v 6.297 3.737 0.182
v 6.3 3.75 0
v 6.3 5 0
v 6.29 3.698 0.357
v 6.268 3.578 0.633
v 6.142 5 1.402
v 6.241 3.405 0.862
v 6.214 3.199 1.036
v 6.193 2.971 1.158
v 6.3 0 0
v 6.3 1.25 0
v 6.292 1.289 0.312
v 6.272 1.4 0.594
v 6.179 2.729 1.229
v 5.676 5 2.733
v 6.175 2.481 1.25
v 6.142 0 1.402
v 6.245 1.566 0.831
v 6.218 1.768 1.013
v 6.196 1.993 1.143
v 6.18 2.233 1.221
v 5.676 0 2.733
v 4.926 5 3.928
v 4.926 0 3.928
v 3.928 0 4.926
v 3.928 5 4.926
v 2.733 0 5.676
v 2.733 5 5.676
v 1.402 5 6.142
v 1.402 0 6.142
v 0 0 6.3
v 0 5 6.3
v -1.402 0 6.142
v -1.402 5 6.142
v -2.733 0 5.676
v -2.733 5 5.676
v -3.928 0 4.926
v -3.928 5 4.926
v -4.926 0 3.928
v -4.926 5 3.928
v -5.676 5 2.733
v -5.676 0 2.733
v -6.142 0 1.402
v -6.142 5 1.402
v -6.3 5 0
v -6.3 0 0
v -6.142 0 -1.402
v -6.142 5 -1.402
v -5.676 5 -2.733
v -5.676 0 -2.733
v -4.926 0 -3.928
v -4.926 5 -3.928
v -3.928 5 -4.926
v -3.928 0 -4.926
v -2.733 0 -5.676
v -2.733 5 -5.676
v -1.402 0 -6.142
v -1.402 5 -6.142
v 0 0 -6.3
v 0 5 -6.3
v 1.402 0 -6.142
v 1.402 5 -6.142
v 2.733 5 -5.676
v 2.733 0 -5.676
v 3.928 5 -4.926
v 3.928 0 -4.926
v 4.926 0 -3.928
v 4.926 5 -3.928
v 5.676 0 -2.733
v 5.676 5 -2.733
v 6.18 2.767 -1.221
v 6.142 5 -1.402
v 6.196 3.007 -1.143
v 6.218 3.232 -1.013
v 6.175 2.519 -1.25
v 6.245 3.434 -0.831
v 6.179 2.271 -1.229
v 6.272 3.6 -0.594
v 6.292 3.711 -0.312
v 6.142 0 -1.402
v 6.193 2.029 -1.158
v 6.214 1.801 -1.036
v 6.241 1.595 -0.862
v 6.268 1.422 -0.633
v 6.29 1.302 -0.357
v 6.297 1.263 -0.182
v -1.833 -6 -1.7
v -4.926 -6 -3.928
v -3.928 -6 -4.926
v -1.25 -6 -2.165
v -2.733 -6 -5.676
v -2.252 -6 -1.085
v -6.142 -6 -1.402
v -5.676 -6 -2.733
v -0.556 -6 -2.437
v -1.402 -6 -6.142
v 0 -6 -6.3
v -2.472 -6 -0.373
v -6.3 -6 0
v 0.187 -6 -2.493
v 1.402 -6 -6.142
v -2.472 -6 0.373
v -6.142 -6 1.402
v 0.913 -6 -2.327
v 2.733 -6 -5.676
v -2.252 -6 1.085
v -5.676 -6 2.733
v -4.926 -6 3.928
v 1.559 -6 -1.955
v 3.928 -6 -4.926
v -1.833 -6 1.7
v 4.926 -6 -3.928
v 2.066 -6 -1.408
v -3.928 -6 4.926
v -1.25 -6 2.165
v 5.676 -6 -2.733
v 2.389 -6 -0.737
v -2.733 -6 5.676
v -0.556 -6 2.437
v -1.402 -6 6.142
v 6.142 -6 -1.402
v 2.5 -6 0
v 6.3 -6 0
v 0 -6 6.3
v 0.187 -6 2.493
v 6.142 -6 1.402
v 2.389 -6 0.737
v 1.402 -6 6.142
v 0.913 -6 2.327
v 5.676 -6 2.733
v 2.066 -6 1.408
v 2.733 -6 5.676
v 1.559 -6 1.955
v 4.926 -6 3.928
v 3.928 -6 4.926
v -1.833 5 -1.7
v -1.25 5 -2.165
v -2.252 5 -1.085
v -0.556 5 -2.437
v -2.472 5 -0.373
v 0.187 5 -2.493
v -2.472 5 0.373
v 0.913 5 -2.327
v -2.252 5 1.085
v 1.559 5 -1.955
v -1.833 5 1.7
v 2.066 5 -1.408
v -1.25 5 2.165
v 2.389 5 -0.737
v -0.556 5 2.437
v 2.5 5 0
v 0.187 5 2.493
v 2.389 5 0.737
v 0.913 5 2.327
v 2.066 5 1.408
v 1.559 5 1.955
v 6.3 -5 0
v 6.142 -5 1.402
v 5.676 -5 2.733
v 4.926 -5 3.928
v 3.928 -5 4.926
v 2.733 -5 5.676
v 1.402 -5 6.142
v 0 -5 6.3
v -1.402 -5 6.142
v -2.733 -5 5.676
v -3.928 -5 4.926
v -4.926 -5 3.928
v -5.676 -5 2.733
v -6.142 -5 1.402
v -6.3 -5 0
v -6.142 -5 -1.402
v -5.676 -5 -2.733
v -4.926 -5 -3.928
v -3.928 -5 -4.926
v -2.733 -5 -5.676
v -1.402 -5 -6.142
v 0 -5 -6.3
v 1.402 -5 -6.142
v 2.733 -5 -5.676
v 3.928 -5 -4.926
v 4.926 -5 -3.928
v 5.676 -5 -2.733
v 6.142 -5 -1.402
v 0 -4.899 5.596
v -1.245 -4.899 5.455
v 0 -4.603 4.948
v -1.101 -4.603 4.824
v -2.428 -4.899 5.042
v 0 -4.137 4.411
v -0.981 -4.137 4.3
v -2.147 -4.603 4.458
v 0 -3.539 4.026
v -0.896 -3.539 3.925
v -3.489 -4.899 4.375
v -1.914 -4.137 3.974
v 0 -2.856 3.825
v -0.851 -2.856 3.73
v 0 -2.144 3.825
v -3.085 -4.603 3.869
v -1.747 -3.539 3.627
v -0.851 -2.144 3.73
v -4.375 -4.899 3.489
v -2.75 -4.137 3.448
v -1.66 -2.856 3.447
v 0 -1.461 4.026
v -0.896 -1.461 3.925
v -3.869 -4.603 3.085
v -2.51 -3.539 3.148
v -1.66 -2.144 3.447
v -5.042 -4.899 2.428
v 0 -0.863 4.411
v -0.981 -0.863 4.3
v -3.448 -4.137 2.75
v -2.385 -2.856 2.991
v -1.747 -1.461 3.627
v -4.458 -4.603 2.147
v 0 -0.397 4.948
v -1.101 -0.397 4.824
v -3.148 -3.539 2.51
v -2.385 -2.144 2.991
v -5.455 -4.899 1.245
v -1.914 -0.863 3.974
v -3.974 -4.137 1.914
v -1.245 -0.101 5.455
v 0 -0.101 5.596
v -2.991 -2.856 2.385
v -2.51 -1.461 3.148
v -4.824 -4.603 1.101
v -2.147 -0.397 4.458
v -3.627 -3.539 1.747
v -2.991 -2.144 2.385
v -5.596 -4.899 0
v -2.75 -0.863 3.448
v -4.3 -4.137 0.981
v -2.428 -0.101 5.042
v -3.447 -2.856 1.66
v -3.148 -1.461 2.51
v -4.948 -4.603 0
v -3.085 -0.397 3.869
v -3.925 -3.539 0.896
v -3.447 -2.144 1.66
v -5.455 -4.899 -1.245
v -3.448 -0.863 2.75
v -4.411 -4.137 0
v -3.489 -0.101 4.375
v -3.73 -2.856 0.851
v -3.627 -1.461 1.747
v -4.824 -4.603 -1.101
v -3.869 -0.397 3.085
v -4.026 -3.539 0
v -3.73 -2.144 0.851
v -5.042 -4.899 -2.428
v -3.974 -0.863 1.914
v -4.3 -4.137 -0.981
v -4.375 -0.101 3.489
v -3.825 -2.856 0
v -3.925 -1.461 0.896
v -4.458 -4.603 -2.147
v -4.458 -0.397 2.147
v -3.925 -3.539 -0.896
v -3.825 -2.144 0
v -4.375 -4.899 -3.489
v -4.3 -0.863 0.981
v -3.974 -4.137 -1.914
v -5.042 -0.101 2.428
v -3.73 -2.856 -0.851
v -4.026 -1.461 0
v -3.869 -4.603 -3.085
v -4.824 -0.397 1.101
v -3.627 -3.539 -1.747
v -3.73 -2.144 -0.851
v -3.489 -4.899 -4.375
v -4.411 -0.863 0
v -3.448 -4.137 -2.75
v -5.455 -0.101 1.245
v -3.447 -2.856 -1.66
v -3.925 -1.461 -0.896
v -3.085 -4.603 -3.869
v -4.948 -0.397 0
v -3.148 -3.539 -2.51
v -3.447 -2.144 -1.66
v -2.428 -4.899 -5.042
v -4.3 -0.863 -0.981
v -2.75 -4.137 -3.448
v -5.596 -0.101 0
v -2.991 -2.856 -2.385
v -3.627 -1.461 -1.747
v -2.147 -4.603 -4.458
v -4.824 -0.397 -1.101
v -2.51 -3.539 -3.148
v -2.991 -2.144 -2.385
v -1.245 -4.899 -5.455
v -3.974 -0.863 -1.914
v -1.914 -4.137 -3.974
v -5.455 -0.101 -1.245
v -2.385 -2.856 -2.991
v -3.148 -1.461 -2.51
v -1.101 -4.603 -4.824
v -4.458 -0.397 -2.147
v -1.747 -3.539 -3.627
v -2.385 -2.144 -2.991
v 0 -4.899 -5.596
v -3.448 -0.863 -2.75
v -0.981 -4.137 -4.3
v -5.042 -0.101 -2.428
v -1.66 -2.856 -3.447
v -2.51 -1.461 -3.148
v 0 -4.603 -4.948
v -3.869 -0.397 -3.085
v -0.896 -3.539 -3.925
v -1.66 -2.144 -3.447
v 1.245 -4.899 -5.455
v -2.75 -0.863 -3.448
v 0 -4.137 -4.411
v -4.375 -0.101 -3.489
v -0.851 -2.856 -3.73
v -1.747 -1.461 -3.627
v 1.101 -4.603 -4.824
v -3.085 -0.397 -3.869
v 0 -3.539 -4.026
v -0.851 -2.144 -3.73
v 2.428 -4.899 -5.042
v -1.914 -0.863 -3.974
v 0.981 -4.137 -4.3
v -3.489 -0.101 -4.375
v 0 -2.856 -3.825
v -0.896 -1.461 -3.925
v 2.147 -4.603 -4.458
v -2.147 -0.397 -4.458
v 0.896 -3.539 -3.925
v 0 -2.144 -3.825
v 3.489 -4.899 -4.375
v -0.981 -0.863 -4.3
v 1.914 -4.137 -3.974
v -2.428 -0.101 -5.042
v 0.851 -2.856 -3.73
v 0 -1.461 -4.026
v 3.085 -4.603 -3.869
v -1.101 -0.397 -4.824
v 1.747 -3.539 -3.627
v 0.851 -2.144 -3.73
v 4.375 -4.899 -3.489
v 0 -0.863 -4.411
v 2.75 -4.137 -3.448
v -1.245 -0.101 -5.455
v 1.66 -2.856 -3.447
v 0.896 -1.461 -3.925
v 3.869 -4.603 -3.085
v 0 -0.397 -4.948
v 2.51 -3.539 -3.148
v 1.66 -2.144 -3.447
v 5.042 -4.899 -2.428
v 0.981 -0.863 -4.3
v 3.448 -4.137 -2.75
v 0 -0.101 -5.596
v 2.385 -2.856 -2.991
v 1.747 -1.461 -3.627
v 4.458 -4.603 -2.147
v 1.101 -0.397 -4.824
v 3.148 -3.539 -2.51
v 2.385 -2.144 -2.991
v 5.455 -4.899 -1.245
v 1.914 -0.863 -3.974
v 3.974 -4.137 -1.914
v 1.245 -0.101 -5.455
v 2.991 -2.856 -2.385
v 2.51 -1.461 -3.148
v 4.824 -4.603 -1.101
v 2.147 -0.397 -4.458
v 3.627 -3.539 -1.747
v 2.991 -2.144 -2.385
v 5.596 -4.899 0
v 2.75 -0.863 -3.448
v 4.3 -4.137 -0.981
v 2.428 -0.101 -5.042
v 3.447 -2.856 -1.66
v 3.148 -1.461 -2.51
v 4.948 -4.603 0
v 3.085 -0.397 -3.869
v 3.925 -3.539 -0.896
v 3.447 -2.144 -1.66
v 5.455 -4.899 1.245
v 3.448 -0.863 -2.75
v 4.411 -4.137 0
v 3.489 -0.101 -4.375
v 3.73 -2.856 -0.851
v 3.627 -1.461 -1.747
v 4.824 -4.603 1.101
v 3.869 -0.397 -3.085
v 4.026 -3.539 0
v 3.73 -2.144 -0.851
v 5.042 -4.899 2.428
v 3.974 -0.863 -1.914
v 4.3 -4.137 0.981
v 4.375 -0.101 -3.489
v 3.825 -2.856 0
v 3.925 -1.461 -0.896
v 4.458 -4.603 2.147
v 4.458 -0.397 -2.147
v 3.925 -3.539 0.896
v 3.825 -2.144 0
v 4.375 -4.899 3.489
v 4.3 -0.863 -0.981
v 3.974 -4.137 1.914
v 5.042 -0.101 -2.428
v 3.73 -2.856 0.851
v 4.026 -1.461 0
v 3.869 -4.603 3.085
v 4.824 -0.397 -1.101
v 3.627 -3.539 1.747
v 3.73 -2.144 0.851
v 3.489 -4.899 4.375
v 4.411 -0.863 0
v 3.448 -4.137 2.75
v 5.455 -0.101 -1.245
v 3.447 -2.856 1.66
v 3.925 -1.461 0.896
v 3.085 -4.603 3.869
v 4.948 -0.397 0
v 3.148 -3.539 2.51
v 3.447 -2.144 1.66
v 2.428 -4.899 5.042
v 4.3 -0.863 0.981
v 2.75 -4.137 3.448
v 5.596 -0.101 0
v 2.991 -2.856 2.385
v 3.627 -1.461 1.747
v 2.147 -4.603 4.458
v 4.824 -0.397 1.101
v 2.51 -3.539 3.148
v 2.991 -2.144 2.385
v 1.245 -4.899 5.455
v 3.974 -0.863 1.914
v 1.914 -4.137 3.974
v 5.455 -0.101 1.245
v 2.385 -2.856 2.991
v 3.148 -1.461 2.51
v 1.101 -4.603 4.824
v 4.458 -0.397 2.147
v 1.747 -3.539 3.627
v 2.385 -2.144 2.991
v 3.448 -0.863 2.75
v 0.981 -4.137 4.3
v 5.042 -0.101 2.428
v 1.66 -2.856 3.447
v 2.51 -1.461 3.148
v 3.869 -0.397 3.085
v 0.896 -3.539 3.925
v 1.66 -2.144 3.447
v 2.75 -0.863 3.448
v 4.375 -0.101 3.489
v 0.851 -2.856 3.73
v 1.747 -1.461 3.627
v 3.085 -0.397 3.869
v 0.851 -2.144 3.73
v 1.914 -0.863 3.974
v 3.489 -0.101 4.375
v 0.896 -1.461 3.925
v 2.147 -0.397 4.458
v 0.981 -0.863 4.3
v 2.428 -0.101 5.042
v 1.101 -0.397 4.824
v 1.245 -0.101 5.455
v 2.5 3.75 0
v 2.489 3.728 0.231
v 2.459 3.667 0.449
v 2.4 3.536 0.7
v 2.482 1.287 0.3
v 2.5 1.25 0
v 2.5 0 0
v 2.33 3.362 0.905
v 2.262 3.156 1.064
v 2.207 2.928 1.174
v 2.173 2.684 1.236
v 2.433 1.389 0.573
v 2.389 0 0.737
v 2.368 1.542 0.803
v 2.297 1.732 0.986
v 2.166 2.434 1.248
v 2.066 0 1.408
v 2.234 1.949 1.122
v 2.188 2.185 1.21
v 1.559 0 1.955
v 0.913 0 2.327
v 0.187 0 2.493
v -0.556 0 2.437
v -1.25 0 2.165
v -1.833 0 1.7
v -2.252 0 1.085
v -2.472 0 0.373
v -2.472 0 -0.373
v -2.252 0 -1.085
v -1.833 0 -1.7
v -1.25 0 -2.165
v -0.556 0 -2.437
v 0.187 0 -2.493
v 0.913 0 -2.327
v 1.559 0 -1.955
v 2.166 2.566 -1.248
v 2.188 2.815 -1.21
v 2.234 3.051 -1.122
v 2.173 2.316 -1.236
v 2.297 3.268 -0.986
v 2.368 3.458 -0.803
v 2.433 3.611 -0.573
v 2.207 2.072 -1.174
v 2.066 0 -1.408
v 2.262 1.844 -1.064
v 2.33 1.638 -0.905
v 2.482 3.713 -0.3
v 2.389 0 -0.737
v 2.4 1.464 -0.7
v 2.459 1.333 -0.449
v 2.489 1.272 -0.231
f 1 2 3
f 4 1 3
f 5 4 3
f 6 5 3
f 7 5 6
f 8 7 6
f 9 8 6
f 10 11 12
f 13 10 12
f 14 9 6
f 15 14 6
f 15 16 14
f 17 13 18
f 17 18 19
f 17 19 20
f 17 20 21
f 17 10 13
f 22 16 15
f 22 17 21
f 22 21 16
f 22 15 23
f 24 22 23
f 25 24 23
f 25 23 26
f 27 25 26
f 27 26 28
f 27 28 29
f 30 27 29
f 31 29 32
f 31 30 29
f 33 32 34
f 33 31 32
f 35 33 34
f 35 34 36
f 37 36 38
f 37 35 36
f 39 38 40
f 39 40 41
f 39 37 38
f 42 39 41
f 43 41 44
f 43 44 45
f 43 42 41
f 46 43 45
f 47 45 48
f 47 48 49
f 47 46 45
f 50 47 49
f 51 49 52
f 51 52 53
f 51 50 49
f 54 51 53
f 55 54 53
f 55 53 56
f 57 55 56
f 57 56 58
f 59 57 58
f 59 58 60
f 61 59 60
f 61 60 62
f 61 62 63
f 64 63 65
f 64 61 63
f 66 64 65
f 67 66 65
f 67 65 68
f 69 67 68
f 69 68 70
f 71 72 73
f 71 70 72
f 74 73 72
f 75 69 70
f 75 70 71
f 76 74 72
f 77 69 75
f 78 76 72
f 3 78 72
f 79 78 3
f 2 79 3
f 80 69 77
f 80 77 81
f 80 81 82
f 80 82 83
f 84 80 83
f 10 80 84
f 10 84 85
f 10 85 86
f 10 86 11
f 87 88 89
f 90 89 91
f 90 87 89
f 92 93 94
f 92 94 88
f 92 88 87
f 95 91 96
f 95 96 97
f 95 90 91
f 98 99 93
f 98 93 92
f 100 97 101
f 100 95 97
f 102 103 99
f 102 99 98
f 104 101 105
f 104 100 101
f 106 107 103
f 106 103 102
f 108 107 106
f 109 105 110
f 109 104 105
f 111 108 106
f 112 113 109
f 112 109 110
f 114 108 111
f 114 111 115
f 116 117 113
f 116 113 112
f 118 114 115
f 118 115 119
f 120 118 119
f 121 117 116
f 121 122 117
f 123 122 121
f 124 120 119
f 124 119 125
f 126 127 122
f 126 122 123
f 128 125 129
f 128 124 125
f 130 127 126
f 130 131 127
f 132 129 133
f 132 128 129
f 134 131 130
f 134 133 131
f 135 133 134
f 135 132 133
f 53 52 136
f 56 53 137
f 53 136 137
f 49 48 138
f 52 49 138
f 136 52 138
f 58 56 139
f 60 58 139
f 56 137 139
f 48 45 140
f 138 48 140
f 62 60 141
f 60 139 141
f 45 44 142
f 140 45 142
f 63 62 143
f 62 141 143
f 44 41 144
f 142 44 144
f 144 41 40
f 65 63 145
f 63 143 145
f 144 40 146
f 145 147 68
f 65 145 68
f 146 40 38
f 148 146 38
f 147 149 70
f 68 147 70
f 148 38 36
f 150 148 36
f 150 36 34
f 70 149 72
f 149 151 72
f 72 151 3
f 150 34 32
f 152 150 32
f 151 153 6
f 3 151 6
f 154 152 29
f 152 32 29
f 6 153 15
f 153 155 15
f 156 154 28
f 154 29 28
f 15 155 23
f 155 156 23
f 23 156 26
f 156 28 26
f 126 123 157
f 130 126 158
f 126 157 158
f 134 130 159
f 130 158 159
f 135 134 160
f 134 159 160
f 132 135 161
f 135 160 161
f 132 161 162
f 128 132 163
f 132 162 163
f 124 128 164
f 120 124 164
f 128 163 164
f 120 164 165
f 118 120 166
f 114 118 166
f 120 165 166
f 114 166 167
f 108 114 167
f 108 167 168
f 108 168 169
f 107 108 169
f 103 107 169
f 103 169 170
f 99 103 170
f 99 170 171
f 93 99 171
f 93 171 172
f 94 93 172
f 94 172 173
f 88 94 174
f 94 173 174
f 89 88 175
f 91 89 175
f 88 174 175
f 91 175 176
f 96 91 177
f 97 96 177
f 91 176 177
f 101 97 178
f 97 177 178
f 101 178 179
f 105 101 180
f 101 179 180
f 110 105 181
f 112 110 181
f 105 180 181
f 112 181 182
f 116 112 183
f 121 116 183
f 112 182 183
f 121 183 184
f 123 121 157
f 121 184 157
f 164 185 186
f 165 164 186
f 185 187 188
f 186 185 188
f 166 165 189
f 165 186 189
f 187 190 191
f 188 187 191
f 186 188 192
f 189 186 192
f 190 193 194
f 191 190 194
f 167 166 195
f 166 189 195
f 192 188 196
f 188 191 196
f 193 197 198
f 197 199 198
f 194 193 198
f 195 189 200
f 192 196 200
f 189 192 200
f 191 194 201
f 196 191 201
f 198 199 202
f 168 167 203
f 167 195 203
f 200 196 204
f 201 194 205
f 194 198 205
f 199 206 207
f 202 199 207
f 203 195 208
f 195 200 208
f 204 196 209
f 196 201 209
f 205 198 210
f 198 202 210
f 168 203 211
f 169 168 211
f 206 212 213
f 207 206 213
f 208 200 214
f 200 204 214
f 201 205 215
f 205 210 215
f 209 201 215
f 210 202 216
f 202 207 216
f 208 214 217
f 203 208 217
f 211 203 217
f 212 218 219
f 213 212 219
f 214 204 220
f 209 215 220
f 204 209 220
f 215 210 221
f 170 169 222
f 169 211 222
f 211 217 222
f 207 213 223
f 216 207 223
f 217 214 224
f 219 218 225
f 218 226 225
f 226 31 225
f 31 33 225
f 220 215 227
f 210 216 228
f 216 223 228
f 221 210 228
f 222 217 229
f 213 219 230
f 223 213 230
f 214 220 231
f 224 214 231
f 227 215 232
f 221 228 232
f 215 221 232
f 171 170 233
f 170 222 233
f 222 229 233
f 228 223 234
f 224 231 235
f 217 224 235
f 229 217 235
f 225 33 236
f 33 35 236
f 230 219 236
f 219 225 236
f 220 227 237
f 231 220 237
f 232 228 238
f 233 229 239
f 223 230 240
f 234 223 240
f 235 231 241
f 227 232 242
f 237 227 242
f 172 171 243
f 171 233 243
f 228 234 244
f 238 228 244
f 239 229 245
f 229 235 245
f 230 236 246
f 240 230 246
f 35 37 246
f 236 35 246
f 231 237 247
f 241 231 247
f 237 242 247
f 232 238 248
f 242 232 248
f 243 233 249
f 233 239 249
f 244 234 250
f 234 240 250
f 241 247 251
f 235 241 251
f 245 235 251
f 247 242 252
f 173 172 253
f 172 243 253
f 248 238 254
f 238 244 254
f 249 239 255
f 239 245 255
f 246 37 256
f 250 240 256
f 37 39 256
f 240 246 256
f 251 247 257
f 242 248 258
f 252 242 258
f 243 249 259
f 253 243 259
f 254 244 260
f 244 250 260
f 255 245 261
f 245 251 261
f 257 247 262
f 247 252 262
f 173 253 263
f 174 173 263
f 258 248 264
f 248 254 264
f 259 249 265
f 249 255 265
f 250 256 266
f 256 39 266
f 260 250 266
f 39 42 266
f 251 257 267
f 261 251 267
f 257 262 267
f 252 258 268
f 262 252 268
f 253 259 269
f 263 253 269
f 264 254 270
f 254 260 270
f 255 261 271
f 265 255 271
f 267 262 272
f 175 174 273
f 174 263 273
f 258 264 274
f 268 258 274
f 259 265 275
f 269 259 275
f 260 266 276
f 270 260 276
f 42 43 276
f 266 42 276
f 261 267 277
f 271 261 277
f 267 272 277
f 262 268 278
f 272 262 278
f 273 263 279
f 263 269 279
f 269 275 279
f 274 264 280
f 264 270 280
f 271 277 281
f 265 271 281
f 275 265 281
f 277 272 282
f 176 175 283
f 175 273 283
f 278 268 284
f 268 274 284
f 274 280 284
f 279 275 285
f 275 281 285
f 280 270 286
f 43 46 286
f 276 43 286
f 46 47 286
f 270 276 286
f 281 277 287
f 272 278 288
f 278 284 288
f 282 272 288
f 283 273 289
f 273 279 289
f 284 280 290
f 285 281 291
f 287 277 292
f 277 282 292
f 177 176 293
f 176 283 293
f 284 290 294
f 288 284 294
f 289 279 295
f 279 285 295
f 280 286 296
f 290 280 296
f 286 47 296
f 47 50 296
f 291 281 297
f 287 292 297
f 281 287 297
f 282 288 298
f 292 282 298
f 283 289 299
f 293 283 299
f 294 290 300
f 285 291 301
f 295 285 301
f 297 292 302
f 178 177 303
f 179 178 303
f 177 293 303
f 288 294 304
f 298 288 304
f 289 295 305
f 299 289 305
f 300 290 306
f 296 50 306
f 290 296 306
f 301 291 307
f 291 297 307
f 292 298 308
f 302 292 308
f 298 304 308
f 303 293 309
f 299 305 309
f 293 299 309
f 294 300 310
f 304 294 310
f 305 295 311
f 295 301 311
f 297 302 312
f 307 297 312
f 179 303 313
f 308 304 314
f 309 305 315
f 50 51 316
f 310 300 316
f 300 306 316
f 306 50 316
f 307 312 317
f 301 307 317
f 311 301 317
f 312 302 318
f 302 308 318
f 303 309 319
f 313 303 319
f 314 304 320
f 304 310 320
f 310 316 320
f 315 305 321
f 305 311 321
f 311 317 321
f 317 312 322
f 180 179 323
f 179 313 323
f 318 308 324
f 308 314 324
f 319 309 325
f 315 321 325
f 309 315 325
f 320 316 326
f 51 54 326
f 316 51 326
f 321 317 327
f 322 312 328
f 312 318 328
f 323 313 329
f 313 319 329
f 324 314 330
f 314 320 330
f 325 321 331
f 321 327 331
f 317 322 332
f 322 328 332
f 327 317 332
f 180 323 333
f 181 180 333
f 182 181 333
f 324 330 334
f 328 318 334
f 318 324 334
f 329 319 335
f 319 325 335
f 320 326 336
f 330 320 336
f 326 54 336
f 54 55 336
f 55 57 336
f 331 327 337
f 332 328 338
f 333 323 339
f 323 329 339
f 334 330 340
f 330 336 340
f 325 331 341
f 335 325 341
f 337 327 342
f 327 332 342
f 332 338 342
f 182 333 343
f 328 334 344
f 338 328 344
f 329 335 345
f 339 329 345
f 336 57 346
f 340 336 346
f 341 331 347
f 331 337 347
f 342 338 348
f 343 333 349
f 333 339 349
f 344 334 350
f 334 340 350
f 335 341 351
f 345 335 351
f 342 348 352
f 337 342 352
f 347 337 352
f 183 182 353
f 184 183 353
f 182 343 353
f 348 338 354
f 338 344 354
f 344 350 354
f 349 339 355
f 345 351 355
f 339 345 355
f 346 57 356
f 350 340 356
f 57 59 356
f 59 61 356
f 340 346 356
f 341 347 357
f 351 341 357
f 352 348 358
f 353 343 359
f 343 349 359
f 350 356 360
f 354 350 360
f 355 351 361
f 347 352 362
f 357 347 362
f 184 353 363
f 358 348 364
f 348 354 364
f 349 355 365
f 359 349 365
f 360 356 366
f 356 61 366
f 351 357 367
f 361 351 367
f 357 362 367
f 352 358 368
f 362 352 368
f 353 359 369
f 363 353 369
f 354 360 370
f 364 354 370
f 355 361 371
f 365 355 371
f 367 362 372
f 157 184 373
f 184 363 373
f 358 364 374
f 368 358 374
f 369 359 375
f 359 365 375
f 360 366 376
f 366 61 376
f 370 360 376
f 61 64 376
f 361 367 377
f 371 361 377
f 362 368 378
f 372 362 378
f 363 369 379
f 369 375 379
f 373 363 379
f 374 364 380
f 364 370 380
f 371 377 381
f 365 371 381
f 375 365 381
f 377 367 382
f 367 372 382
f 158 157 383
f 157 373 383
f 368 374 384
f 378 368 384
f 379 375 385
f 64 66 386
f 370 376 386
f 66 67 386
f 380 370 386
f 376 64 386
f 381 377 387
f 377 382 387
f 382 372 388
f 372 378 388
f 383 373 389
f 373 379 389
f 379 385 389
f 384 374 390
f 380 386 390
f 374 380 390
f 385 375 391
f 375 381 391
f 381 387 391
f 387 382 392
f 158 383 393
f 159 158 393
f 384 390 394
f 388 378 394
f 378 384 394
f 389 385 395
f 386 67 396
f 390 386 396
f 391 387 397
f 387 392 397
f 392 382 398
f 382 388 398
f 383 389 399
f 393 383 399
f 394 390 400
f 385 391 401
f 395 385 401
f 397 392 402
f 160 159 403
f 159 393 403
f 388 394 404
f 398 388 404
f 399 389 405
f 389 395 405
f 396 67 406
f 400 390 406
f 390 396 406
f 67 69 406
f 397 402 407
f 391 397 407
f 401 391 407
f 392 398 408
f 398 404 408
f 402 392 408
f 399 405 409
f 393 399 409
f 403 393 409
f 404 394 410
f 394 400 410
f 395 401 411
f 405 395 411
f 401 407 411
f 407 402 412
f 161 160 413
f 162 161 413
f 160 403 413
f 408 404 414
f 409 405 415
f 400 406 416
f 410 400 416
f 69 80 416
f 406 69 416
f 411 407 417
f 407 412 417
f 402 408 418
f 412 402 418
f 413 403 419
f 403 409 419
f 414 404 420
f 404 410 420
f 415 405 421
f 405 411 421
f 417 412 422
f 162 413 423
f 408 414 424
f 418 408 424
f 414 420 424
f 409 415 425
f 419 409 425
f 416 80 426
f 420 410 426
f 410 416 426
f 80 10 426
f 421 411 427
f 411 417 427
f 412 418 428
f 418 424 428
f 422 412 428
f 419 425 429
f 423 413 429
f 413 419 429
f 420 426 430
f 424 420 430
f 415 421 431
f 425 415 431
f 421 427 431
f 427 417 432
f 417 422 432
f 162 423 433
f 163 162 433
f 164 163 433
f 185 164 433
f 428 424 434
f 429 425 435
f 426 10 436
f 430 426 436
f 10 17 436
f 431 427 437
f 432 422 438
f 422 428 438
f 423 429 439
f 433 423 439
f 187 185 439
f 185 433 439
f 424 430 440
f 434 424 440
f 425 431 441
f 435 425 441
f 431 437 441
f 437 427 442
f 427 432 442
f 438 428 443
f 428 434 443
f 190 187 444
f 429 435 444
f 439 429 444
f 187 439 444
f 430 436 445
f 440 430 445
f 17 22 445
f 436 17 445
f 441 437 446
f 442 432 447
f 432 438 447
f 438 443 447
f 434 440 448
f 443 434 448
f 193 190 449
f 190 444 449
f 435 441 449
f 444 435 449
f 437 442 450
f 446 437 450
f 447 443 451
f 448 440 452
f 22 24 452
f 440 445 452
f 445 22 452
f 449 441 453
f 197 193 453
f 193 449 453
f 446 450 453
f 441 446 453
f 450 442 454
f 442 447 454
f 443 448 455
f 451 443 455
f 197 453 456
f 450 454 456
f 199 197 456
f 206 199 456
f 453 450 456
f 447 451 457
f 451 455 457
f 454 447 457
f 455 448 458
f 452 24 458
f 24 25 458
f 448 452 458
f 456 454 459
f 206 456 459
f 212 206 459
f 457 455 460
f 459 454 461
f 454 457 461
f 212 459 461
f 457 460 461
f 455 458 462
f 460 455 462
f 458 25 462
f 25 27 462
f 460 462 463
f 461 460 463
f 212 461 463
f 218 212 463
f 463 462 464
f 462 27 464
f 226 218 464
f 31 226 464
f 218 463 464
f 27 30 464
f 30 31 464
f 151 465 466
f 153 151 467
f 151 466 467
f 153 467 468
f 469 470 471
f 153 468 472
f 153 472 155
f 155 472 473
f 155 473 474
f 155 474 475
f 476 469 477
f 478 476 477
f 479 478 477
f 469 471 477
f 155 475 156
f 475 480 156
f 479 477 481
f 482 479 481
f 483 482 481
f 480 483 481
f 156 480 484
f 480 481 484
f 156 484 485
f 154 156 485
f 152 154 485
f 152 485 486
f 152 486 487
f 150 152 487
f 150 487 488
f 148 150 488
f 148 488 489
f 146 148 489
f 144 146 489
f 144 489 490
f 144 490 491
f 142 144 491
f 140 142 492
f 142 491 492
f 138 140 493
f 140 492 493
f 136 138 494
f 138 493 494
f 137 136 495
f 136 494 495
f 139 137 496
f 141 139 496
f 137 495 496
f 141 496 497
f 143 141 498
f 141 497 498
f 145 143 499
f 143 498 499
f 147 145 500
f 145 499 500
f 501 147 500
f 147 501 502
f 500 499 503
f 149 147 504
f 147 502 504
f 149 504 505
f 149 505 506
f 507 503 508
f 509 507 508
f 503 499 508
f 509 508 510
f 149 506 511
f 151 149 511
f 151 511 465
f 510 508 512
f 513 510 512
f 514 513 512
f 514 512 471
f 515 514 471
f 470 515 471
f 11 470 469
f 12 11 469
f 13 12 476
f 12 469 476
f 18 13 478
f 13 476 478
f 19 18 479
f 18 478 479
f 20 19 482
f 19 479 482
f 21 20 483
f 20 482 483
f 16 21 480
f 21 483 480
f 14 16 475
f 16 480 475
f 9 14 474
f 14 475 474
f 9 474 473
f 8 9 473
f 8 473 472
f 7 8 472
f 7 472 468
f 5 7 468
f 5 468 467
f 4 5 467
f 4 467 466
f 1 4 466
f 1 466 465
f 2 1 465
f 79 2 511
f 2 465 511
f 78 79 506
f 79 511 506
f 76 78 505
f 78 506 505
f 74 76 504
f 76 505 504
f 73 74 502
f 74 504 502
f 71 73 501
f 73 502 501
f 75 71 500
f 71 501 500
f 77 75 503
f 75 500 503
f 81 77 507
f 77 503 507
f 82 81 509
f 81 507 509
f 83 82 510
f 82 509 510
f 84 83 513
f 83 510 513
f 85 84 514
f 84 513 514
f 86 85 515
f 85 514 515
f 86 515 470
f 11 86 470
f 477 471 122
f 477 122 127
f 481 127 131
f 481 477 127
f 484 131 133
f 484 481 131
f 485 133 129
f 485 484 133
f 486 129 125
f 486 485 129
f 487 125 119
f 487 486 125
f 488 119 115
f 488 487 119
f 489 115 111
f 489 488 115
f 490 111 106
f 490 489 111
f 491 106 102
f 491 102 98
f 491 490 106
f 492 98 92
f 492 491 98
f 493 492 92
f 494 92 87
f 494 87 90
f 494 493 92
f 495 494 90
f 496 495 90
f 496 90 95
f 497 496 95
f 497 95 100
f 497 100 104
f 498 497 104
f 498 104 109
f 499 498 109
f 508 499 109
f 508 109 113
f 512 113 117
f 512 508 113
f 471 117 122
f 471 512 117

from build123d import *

# Parameters (mm, degrees)
F0_R          = 6.3
F0_R_2        = 2.5
F1_DEPTH      = 5
F1_DEPTH_BACK = 6
F6_D          = 2.5
F6_DEPTH      = 5
F6_START      = 0.1252531
F6_TIP        = 0.7510757738


with BuildPart() as f1:
    # F0 (on Front) → F1 (new body, two sides)
    with BuildSketch(Plane.XZ) as f1_sk:
        Circle(F0_R)
        Circle(F0_R_2, mode=Mode.SUBTRACT)
    extrude(amount=-F1_DEPTH)
    extrude(f1_sk.sketch, amount=F1_DEPTH_BACK)

    # F2 (on Right) → F3 (revolve, cut)
    with BuildSketch(Plane.YZ):
        with BuildLine():
            ThreePointArc((0, 6.3), (-2.5, 8.8), (-5, 6.3))
            Line((-5, 6.3), (0, 6.3))
        make_face()
        with BuildLine():
            Line((0, 6.3), (-5, 6.3))
            ThreePointArc((-5, 6.3), (-2.5, 3.8), (0, 6.3))
        make_face()
    revolve(axis=Axis((0, -6, 0), (0, -1, 0)), mode=Mode.SUBTRACT)

    # F6
    # its depths count from where the whole tool has entered the part; down to there all is cleared
    with Locations(Plane.YZ.offset(6.3).offset(-F6_START)):
        with Locations((2.5, 0)):
            Hole(F6_D / 2, depth=F6_DEPTH)
            with Locations((0, 0, -(F6_DEPTH + F6_TIP / 2))):  # 118° drill point
                Cone(0, F6_D / 2, F6_TIP, mode=Mode.SUBTRACT)


solid = f1.part
